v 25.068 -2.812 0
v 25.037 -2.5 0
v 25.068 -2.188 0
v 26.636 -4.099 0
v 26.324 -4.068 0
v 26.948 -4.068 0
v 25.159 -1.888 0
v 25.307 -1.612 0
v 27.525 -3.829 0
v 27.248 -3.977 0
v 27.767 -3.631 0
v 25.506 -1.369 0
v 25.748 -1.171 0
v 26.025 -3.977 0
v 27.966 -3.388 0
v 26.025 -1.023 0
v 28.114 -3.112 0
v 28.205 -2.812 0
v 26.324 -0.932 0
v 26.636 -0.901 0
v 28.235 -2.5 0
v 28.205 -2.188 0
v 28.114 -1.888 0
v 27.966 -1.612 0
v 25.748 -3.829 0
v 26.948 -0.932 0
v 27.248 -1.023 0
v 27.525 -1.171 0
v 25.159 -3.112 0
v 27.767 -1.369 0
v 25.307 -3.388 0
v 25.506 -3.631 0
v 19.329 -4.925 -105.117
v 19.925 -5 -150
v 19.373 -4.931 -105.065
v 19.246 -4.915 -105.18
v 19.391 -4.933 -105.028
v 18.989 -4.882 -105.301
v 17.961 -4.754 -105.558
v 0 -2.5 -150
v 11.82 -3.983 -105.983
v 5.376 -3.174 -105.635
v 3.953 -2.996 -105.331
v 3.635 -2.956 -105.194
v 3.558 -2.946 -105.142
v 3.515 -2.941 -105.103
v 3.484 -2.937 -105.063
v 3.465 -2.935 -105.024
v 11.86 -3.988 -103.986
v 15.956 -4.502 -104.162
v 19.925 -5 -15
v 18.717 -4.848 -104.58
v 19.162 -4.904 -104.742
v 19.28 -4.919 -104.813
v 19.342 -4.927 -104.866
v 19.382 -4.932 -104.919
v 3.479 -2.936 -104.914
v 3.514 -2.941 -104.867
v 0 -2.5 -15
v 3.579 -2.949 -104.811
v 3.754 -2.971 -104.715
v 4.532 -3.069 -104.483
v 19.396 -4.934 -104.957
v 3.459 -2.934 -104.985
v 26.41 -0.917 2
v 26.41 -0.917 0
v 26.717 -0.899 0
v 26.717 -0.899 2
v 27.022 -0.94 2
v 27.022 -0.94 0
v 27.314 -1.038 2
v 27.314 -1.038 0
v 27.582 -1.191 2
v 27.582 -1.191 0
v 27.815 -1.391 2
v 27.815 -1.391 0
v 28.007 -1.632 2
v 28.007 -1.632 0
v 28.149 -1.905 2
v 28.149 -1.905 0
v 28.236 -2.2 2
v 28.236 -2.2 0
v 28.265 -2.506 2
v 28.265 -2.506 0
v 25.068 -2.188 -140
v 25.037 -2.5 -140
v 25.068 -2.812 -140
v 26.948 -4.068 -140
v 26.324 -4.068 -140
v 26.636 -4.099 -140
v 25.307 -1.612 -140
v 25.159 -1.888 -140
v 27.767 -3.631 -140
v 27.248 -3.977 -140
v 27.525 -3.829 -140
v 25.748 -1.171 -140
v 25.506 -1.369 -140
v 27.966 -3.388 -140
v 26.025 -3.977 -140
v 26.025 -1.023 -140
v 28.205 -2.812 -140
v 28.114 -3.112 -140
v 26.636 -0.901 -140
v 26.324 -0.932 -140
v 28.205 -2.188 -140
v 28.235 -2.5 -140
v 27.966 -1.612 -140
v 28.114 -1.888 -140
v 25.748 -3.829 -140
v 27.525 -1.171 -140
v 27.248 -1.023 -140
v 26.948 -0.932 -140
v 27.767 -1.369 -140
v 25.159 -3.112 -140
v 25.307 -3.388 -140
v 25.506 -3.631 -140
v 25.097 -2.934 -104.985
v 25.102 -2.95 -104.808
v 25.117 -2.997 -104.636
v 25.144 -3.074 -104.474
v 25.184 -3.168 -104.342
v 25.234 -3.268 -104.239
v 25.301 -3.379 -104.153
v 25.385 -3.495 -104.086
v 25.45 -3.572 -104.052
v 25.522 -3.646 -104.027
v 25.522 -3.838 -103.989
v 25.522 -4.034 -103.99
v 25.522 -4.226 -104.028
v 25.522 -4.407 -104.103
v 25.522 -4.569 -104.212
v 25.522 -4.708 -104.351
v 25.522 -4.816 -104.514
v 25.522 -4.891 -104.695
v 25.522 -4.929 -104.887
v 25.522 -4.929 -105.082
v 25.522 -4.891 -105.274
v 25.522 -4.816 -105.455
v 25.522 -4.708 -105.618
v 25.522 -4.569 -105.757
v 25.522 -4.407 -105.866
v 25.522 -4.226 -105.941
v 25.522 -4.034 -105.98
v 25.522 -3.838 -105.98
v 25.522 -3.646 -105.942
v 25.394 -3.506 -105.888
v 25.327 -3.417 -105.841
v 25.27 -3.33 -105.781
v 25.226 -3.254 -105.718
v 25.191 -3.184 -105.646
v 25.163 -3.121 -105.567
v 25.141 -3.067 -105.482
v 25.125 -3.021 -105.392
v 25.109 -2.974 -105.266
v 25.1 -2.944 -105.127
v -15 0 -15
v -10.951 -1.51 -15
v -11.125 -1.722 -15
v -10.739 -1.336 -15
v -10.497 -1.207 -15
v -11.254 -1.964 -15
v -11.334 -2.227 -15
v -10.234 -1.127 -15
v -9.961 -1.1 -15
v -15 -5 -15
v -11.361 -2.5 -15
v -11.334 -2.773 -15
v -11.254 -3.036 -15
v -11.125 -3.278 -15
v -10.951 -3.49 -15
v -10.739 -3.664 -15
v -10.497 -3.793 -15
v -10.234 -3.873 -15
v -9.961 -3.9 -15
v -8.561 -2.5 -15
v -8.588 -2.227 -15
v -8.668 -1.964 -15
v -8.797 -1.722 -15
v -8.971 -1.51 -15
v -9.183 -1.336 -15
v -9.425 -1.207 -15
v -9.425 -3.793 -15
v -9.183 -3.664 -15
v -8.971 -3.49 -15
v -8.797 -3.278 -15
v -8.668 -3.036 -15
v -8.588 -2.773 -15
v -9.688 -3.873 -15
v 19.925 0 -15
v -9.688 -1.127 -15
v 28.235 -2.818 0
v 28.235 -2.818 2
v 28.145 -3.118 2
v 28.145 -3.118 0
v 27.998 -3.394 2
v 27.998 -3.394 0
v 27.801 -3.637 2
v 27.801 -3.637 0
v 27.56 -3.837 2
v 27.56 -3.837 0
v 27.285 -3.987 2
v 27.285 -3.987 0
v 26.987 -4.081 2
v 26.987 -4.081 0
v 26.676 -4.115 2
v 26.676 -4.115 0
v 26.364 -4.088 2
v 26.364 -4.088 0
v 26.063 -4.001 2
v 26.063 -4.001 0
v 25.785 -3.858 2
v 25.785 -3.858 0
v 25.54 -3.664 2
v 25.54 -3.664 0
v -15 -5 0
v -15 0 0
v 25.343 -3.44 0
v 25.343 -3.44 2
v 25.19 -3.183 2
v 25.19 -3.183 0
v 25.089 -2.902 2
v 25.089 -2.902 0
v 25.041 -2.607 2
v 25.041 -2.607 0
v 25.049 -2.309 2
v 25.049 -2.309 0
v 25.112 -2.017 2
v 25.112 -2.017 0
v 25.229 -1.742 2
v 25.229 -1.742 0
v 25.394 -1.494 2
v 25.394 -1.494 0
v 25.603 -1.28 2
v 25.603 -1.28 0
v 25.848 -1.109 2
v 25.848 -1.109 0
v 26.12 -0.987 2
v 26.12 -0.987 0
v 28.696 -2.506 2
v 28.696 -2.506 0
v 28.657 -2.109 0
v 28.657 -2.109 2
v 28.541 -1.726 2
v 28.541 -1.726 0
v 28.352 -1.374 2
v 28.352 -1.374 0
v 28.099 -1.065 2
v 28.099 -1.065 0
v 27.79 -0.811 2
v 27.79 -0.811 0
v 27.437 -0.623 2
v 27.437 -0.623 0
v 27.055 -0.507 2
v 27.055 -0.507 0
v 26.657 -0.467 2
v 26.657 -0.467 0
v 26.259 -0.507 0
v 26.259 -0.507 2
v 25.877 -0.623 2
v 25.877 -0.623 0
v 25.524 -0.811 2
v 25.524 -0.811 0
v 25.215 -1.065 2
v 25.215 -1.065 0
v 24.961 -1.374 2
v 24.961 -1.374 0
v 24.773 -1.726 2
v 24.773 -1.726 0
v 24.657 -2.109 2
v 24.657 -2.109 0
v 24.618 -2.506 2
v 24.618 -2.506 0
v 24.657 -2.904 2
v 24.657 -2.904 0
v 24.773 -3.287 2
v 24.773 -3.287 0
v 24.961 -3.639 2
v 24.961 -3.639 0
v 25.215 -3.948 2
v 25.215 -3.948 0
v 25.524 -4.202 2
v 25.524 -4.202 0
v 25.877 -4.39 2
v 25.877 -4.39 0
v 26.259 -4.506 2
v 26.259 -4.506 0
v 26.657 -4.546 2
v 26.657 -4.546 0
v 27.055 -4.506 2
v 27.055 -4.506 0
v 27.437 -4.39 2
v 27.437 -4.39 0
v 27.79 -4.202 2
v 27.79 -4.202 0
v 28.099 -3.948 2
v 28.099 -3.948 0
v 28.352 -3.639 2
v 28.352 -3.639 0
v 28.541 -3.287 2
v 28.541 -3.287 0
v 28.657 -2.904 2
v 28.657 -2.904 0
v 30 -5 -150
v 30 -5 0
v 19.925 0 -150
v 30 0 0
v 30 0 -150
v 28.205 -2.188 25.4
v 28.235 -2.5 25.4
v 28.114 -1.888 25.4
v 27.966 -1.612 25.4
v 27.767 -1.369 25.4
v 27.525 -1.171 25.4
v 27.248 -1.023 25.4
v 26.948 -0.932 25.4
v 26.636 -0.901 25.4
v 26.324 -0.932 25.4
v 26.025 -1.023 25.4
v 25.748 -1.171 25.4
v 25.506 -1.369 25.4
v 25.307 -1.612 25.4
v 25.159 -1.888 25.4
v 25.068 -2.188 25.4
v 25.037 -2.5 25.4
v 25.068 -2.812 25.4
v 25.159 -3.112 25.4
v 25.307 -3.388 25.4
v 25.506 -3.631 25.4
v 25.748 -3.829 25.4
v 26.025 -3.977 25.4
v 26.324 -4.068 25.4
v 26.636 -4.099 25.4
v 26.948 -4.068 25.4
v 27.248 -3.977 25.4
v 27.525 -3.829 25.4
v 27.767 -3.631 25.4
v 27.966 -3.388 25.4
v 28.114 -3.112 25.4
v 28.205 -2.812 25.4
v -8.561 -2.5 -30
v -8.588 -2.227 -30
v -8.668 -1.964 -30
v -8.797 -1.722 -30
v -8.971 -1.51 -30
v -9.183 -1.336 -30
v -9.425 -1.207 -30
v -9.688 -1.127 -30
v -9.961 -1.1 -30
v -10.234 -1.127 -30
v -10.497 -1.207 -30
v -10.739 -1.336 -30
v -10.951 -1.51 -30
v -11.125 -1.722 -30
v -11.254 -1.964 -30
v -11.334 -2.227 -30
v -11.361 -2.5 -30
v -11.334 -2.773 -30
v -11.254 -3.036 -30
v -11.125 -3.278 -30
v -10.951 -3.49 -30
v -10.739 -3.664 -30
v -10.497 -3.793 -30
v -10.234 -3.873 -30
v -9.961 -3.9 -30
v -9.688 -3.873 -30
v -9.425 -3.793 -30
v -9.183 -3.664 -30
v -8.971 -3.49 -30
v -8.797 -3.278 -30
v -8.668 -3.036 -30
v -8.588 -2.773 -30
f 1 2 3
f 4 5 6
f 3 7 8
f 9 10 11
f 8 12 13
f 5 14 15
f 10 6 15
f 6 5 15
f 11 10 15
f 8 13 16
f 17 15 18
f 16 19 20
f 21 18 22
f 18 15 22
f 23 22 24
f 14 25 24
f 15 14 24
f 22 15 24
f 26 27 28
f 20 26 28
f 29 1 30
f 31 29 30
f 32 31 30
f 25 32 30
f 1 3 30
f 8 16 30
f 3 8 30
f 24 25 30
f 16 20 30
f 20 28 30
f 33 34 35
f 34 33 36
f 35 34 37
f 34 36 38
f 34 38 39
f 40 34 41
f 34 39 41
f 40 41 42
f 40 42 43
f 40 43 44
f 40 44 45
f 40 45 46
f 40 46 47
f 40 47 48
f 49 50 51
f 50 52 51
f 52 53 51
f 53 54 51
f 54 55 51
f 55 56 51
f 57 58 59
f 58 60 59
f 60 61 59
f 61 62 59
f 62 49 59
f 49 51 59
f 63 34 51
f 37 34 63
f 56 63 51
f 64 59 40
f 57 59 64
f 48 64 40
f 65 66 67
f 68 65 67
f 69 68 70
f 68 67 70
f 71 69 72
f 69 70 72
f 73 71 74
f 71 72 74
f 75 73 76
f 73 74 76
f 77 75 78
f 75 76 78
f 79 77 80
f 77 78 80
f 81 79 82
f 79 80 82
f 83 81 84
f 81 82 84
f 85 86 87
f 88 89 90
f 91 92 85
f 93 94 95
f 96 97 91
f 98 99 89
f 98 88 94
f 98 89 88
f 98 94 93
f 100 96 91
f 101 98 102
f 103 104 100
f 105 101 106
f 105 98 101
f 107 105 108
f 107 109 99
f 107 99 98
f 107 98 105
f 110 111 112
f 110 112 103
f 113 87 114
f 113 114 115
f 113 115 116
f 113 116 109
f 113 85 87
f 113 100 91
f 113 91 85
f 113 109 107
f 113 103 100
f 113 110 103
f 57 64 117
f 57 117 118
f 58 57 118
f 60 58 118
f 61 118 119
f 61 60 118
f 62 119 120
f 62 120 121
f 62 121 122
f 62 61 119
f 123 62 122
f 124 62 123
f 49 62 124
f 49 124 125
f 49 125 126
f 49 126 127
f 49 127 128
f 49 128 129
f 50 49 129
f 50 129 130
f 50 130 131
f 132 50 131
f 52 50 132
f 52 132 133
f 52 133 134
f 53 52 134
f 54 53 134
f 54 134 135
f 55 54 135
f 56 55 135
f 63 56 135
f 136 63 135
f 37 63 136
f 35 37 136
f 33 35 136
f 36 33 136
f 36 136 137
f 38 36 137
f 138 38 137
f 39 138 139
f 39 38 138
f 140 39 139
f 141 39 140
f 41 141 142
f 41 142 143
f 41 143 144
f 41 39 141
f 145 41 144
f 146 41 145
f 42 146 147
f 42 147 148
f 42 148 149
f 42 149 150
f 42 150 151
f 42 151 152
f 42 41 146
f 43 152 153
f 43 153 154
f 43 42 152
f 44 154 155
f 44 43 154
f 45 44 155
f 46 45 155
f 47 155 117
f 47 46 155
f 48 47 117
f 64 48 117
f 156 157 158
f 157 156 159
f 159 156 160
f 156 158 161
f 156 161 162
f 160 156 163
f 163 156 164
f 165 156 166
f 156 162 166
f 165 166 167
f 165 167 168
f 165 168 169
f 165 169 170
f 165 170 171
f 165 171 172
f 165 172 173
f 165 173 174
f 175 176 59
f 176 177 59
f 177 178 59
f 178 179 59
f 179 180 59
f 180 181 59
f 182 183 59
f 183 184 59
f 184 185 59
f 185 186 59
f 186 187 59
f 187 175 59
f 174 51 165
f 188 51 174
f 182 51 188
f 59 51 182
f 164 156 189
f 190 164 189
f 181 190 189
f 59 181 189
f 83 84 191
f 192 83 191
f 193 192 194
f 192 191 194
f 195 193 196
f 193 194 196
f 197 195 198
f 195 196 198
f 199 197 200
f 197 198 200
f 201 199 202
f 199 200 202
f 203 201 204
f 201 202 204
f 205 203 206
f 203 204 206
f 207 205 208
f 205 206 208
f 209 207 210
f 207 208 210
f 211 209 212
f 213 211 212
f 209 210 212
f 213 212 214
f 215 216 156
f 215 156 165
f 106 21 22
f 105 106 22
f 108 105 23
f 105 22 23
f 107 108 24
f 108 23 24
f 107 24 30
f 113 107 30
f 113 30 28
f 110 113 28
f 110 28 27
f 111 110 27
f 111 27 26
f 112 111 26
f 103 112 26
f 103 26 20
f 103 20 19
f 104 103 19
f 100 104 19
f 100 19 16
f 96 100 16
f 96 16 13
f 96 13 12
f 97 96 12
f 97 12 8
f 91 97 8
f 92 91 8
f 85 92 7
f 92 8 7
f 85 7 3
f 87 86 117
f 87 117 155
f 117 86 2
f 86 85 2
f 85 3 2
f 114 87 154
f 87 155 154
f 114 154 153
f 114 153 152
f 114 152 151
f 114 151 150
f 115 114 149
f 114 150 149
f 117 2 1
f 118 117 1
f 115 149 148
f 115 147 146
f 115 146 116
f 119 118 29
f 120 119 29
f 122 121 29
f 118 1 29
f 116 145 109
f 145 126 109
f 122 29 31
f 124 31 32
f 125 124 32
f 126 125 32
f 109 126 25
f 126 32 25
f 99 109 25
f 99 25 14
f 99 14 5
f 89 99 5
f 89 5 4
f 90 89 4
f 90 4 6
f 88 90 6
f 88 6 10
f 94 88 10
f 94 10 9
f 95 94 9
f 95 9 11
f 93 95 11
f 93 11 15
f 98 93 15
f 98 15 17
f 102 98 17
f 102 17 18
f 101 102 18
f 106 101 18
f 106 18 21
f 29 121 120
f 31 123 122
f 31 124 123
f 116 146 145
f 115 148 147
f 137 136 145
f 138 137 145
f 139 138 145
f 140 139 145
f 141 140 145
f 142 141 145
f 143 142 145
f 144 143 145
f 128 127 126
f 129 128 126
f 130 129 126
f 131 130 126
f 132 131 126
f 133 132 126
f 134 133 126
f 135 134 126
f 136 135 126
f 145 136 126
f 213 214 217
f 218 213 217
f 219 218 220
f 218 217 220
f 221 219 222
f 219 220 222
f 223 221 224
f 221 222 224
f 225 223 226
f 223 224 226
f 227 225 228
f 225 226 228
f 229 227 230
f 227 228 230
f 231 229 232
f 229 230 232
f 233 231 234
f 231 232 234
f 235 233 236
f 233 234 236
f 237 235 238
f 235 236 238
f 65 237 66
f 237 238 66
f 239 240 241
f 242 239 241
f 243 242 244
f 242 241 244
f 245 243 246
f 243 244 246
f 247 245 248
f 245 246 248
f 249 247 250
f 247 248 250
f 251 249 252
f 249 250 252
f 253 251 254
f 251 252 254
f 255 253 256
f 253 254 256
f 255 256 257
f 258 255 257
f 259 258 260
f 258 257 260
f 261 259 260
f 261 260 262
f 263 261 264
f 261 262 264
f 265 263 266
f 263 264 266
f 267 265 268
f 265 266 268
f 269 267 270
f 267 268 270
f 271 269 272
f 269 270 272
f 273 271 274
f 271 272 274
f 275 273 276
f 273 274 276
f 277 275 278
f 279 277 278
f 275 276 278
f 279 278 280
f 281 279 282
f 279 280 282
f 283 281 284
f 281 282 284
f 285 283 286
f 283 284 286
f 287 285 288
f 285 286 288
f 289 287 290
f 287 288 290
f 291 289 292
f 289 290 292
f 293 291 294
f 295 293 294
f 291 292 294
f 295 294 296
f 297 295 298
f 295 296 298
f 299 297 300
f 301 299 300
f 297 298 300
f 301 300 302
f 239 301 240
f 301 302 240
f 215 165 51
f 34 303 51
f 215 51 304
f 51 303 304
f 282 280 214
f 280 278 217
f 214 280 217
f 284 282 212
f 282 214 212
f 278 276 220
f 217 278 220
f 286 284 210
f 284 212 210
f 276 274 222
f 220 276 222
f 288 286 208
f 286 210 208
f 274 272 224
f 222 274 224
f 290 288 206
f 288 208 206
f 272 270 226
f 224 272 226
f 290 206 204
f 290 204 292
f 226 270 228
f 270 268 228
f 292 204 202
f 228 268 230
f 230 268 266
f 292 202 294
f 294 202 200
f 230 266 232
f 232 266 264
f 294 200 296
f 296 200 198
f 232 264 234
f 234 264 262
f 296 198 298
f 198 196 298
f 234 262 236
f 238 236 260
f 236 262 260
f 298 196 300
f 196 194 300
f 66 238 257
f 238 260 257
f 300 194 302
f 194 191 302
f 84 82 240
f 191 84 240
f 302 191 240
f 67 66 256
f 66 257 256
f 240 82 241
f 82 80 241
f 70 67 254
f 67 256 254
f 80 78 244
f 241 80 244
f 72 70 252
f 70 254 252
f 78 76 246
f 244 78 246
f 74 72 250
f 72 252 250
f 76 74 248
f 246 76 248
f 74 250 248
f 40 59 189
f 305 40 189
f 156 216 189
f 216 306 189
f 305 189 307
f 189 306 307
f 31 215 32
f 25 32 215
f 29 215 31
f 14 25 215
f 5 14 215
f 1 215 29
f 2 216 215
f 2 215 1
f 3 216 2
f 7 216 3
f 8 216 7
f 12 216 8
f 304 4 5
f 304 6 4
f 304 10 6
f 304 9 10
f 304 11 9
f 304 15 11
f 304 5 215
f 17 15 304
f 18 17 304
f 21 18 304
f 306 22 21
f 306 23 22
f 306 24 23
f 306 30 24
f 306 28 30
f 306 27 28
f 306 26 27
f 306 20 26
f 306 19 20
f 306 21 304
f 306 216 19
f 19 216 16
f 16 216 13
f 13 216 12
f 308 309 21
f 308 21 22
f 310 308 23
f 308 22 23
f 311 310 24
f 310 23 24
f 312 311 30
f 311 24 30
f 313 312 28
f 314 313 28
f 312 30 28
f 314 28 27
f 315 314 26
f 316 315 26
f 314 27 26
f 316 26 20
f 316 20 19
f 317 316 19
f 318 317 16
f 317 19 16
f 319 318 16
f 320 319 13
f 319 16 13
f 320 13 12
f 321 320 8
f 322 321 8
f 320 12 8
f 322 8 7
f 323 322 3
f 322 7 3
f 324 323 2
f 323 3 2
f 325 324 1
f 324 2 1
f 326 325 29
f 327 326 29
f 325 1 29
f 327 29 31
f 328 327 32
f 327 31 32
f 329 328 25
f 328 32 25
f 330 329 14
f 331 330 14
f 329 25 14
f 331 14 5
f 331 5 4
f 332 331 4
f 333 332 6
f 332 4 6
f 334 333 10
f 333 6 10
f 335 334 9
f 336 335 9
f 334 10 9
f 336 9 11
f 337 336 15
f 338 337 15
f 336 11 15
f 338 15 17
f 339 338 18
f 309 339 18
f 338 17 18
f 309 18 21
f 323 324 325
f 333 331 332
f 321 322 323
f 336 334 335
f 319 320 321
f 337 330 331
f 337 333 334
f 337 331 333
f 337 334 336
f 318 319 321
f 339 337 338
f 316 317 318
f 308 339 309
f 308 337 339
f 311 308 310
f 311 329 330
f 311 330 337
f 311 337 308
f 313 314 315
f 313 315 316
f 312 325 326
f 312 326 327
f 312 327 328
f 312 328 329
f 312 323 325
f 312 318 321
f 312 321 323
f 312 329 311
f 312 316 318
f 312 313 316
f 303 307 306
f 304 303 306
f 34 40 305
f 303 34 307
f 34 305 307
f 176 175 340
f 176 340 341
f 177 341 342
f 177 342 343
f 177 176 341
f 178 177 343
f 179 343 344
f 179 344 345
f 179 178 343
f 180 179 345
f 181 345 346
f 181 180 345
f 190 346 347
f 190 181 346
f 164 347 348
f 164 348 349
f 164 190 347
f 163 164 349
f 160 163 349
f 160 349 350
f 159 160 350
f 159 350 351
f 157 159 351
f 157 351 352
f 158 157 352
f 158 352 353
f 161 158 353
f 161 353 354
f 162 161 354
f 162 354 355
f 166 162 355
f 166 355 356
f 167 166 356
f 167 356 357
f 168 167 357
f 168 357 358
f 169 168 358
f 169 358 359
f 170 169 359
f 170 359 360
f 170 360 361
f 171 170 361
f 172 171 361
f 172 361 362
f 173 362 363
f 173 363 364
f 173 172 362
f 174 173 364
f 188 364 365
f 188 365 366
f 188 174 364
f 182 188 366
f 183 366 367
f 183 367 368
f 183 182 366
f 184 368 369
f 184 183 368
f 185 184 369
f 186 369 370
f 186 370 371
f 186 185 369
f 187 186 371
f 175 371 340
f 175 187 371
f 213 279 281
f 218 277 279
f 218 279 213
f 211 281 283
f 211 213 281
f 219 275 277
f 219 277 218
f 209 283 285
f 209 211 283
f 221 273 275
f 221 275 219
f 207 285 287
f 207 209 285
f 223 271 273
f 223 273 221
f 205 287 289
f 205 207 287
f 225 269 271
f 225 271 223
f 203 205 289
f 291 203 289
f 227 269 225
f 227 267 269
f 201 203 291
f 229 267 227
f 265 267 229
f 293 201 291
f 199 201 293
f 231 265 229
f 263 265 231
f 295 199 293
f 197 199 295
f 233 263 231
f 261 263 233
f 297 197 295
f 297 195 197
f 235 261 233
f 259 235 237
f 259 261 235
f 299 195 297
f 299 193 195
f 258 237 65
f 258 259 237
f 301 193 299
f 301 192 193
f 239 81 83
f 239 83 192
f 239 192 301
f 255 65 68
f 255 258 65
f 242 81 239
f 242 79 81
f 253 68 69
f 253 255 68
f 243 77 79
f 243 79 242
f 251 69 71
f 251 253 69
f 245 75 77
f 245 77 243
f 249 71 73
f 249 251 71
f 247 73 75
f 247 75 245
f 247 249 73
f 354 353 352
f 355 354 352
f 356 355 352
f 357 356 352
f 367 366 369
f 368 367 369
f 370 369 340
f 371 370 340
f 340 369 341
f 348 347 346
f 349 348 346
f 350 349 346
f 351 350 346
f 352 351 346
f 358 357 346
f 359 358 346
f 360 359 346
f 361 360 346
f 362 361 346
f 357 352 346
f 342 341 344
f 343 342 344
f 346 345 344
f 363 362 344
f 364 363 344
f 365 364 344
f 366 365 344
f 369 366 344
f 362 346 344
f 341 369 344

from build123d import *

# Parameters (mm, degrees)
F0_W      = 30
F0_H      = 150
F1_DEPTH  = 5
F3_DEPTH  = 150.001
F2_R      = 1.5989652731
F4_DEPTH  = 140
F5_R      = 1
F6_DEPTH  = 25.5216695368
F7_DEPTH  = 15
F9_DEPTH  = 15
F10_R     = 1.4
F11_DEPTH = 30
F13_DEPTH = 25.4
F12_R     = 2.0390969853
F14_DEPTH = 2


with BuildPart() as f1:
    # F0 (on Front) → F1 (new body)
    with BuildSketch(Plane.XZ):
        with Locations((15, -75)):
            Rectangle(F0_W, F0_H)
    extrude(amount=F1_DEPTH)

    # F2 (on face) → F3 (cut, through all)
    with BuildSketch(Plane.XY):
        Polygon((0, -2.5), (19.9251845479, 0), (0, 0), align=None)
        Polygon((19.9251845479, -5), (0, -2.5), (0, -5), align=None)
    extrude(amount=-F3_DEPTH, mode=Mode.SUBTRACT)

    # F2 (on face) → F4 (cut)
    with BuildSketch(Plane.XY):
        with Locations((26.6364086419, -2.5)):
            Circle(F2_R)
    extrude(amount=-F4_DEPTH, mode=Mode.SUBTRACT)

    # F5 (on Right) → F6 (cut)
    with BuildSketch(Plane.YZ):
        with Locations((-3.9339680225, -104.9845516682)):
            Circle(F5_R)
    extrude(amount=F6_DEPTH, mode=Mode.SUBTRACT)

    # F2 (on face) → F7 (join)
    with BuildSketch(Plane.XY):
        Polygon((0, -2.5), (19.9251845479, 0), (0, 0), align=None)
        Polygon((30, 0), (19.9251845479, 0), (0, -2.5), (19.9251845479, -5), (30, -5), align=None)
        with Locations((26.6364086419, -2.5)):
            Circle(F2_R, mode=Mode.SUBTRACT)
        Polygon((19.9251845479, -5), (0, -2.5), (0, -5), align=None)
    extrude(amount=-F7_DEPTH)

    # F8 (on face) → F9 (join)
    with BuildSketch(Plane(origin=(0, 0, 0), x_dir=(0, -1, 0), z_dir=(-1, 0, 0))):
        Polygon((5, 0), (0, 0), (0, -15), (2.5, -15), (5, -15), align=None)
    extrude(amount=F9_DEPTH)

    # F10 (on face) → F11 (join)
    with BuildSketch(Plane.XY):
        with Locations((-9.9609950557, -2.5)):
            Circle(F10_R)
    extrude(amount=-F11_DEPTH)


with BuildPart() as f13:
    # F2 (on face) → F13 (new body)
    with BuildSketch(Plane.XY):
        with Locations((26.6364086419, -2.5)):
            Circle(F2_R)
    extrude(amount=F13_DEPTH)


with BuildPart() as f14:
    # F12 (on face) → F14 (new body)
    with BuildSketch(Plane.XY):
        with Locations((26.6568399966, -2.5064747315)):
            Circle(F12_R)
        with BuildLine():
            ThreePointArc((26.4101542038, -0.9171232285), (27.7032928469, -1.2850704117), (28.2652218171, -2.5064747315))
            ThreePointArc((28.2652218171, -2.5064747315), (27.2854196118, -3.9869407891), (25.5397747623, -3.6636511842))
            ThreePointArc((25.5397747623, -3.6636511842), (25.112150682, -2.0169600262), (26.4101542038, -0.9171232285))
        make_face(mode=Mode.SUBTRACT)
    extrude(amount=F14_DEPTH)


solid = Compound([f1.part, f13.part, f14.part])
